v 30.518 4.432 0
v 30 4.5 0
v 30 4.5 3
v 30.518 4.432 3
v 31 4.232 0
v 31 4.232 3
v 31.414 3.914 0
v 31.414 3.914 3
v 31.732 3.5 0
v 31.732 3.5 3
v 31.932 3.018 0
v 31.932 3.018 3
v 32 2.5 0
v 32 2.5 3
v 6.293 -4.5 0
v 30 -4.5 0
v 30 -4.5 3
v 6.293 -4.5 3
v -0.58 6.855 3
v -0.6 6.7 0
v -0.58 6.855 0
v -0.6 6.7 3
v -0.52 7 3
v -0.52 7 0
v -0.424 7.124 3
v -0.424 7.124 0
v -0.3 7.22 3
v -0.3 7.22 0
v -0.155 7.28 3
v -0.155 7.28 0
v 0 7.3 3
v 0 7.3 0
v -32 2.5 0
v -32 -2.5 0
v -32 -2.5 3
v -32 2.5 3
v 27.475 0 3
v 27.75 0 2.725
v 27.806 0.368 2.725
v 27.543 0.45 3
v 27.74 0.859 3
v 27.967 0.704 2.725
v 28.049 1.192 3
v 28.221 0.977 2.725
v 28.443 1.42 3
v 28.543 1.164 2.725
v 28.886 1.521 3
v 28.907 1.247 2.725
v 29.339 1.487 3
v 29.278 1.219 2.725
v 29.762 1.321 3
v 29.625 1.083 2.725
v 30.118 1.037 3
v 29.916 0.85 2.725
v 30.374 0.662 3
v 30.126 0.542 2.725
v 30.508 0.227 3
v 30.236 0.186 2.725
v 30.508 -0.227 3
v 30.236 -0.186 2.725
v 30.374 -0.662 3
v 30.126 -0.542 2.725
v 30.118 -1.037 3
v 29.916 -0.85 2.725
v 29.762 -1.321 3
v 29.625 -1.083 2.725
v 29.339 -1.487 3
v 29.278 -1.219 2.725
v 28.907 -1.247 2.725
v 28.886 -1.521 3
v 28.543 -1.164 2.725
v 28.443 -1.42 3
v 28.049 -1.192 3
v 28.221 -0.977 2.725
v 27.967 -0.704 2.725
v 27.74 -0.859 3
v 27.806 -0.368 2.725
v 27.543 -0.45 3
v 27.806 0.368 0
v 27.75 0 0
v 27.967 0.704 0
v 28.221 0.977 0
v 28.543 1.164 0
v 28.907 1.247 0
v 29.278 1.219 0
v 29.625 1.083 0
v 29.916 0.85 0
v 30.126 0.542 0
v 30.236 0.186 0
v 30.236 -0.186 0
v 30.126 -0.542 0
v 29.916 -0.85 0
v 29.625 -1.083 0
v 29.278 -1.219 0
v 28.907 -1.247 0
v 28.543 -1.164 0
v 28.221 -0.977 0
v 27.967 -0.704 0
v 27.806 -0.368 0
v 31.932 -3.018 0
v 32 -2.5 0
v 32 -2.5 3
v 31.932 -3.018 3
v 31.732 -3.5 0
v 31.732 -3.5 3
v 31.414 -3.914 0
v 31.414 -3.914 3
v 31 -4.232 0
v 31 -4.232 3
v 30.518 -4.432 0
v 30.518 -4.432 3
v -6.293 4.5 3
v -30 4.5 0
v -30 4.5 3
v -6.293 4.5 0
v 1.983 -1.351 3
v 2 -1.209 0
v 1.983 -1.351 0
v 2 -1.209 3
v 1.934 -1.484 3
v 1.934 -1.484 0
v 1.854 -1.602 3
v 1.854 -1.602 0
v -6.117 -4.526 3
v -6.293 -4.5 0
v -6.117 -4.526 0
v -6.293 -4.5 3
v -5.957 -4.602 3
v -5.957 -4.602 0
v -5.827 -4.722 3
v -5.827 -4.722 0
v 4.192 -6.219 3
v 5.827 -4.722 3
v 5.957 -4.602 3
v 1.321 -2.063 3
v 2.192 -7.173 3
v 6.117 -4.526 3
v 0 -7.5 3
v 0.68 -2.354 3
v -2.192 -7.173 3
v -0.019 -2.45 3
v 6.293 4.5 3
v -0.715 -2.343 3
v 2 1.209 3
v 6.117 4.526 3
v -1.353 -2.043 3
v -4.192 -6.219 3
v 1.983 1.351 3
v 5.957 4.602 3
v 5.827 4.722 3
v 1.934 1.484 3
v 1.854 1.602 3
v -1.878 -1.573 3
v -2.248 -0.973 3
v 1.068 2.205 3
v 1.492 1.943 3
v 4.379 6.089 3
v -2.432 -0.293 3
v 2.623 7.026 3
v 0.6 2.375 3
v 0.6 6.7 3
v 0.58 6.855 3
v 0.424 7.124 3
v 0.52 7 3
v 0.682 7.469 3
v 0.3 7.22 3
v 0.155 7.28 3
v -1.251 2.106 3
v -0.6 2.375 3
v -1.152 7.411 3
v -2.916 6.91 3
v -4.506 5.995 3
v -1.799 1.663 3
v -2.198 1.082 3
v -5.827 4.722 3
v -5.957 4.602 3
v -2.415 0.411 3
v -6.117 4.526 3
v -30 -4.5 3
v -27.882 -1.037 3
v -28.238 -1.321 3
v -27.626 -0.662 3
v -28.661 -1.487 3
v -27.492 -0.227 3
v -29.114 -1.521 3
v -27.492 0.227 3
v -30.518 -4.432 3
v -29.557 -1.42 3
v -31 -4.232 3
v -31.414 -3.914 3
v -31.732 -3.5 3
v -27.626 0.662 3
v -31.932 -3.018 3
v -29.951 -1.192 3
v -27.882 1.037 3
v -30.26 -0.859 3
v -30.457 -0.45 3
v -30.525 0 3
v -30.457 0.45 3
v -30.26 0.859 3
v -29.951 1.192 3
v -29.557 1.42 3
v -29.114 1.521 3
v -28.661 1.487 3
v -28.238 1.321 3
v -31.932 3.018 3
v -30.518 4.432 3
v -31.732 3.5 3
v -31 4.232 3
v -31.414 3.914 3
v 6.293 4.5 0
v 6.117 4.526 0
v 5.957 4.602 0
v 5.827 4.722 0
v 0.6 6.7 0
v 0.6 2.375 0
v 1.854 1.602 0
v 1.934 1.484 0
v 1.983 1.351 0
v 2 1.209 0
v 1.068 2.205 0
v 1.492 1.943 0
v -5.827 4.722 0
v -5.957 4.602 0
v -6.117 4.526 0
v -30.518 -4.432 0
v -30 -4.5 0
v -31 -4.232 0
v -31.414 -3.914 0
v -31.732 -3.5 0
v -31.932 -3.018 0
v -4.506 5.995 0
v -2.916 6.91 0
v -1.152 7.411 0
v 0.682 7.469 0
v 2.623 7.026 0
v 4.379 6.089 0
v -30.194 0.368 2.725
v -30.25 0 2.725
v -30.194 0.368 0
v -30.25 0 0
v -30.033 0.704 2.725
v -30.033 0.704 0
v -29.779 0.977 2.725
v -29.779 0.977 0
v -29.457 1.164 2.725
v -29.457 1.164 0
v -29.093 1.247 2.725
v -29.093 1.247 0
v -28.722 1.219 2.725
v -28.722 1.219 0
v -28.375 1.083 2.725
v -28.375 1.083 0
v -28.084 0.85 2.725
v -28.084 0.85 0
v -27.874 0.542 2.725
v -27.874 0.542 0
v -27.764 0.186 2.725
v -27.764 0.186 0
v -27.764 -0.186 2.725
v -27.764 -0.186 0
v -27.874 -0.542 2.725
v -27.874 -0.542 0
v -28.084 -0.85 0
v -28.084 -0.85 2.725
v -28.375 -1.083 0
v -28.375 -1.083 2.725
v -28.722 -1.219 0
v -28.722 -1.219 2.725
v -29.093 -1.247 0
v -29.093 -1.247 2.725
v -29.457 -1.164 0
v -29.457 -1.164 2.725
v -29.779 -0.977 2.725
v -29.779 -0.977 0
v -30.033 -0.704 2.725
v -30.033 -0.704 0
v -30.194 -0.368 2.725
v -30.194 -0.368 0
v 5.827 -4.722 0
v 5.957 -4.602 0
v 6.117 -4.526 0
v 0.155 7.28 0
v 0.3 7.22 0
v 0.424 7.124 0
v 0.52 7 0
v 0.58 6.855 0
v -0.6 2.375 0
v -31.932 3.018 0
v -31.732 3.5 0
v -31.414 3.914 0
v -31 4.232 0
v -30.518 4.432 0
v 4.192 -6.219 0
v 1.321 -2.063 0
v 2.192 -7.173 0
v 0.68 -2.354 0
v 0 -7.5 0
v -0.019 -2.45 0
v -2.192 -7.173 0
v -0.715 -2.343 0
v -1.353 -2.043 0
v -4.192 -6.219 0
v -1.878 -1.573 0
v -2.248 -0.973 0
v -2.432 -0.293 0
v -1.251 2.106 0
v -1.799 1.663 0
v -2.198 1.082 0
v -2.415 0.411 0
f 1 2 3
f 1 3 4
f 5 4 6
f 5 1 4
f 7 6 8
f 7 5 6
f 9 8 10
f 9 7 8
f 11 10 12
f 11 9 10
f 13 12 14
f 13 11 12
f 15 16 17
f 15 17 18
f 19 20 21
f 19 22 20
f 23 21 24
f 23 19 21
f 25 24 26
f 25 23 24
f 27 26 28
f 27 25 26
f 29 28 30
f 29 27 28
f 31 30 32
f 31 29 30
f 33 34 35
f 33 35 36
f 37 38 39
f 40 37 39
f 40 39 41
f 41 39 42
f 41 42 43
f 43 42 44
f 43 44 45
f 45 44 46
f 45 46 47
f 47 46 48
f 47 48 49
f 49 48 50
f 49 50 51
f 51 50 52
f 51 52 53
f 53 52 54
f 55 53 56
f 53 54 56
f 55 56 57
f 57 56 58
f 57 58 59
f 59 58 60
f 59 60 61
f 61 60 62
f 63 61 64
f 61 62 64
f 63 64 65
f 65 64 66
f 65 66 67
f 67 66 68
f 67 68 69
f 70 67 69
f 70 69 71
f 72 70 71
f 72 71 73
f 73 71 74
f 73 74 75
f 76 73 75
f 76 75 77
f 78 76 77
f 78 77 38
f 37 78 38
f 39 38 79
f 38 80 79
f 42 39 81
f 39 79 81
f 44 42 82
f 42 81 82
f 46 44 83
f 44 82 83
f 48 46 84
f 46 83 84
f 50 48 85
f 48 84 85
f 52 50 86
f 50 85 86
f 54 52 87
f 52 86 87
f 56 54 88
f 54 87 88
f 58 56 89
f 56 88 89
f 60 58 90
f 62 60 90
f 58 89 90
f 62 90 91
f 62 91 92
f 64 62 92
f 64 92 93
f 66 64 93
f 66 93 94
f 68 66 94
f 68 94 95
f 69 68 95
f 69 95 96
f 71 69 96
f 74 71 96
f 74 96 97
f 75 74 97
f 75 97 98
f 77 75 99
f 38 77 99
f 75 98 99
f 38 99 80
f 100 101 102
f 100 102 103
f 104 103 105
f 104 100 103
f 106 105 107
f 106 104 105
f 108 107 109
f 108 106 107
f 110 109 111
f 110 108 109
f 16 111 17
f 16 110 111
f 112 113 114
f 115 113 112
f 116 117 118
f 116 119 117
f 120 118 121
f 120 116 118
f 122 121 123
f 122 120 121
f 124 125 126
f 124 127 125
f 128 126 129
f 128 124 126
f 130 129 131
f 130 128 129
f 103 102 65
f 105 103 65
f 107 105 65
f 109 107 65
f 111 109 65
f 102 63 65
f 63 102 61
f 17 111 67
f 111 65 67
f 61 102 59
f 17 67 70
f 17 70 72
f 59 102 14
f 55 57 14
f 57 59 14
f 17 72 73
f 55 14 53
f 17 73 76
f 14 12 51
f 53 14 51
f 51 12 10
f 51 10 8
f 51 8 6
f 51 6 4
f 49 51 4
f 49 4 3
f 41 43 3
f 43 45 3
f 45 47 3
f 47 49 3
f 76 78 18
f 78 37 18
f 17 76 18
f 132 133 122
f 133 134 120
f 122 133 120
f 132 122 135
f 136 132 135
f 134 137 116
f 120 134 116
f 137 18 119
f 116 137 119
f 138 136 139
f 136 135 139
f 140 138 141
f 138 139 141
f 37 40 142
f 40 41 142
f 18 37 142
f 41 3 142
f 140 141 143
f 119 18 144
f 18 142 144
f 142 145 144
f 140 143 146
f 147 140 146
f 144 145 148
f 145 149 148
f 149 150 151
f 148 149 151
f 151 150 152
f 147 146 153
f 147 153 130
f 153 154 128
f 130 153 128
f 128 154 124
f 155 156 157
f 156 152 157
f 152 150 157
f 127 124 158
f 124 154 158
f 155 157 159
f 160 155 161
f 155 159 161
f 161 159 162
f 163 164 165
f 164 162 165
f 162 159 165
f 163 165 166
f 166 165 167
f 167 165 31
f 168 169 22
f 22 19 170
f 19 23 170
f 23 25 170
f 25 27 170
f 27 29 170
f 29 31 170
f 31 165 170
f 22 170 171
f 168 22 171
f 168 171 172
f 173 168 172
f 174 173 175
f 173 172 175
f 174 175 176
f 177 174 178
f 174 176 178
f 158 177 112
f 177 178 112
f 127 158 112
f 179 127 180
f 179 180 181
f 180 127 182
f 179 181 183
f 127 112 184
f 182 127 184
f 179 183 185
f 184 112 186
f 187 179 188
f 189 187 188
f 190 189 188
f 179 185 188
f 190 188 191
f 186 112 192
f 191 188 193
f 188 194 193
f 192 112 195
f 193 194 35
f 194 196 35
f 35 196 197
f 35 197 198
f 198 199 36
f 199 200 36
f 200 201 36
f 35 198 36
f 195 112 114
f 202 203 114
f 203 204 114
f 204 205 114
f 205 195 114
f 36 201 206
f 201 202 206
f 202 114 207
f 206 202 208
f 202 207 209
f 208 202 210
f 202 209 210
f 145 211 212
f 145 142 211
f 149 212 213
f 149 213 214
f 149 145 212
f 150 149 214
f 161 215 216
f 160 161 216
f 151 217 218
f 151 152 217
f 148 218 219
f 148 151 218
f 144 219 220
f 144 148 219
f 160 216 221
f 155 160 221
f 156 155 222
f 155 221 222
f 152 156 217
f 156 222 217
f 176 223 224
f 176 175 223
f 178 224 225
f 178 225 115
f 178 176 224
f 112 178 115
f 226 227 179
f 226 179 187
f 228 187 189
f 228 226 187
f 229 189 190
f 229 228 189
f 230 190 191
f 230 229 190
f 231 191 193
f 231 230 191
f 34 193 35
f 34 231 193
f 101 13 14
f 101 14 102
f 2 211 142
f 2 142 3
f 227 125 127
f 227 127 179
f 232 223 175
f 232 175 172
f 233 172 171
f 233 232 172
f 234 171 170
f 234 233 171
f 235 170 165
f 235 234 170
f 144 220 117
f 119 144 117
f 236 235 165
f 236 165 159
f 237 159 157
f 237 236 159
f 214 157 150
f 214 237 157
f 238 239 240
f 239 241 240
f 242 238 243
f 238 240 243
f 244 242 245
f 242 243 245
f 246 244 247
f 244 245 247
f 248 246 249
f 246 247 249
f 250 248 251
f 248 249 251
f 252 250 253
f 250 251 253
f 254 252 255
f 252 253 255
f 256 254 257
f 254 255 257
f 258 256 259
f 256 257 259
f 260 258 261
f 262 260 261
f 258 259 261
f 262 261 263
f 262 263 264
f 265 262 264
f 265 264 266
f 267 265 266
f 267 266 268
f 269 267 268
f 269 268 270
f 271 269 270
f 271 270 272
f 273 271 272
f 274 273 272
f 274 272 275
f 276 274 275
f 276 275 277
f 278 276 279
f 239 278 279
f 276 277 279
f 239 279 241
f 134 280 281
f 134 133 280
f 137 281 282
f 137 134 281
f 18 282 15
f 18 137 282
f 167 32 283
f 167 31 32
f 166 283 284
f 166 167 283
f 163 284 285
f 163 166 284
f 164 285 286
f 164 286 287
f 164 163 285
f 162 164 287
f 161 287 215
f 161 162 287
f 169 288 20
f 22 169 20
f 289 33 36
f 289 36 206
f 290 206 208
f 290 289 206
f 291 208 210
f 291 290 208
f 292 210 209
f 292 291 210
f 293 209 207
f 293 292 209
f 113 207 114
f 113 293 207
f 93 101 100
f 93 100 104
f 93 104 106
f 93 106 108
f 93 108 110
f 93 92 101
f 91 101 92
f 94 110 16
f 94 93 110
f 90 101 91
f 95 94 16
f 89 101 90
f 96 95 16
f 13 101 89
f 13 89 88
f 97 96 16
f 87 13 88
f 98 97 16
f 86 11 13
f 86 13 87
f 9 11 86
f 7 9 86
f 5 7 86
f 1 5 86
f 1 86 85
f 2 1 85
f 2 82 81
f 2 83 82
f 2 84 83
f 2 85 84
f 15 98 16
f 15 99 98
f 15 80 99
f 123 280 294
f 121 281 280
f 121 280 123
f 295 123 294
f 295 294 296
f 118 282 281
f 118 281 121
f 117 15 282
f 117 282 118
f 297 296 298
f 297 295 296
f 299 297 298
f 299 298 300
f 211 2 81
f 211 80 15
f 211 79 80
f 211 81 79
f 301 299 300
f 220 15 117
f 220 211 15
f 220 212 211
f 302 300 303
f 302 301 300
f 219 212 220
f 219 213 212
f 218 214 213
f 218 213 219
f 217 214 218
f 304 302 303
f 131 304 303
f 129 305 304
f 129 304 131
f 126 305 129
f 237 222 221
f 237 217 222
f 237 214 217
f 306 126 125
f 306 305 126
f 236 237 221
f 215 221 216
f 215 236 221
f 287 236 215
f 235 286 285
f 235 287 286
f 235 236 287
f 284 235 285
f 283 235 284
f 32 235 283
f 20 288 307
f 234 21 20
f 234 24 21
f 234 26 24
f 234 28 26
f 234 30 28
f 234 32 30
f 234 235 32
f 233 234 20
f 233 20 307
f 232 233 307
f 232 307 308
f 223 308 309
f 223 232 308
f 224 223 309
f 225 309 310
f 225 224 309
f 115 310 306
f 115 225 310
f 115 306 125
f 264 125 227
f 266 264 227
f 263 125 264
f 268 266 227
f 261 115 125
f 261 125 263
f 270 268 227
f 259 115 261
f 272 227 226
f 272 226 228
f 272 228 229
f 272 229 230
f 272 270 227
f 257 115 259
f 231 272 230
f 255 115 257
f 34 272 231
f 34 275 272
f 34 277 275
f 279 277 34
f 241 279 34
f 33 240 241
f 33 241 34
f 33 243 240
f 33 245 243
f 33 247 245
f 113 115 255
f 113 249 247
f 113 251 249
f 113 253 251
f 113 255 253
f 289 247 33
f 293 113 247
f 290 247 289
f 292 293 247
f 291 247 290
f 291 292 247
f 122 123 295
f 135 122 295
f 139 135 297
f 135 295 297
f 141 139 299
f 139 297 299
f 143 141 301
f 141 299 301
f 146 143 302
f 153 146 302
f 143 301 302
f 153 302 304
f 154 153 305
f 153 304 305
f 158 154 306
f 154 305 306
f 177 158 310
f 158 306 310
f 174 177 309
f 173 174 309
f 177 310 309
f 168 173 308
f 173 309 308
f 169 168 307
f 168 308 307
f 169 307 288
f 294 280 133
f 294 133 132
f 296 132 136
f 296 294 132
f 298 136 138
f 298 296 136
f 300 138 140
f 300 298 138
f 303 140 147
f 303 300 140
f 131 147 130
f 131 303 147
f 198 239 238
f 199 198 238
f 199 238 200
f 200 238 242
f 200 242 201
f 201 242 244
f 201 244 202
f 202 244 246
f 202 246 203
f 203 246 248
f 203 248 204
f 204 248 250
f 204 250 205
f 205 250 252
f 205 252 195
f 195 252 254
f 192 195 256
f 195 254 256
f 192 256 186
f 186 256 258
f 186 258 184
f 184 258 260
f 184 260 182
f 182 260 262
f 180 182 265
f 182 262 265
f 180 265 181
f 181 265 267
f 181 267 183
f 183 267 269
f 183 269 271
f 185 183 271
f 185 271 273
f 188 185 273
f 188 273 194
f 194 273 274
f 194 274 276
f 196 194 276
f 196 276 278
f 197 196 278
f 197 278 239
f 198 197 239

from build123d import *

# Parameters (mm, degrees)
EXTRUDE_1_DEPTH      = 3
M3X0_5_1_D           = 2.5
M3X0_5_1_CSINK_D     = 3.05
M3X0_5_1_CSINK_ANGLE = 90
FILLET_1_R           = 0.6


with BuildPart() as part:
    # 草图1 → 凸台-拉伸1 (new body)
    with BuildSketch(Plane.XY):
        with BuildLine():
            Line((6, 4.5), (30, 4.5))
            ThreePointArc((30, 4.5), (31.414213562, 3.914213562), (32, 2.5))
            Line((32, 2.5), (32, -2.5))
            ThreePointArc((32, -2.5), (31.414213562, -3.914213562), (30, -4.5))
            Line((30, -4.5), (6, -4.5))
            ThreePointArc((6, -4.5), (0, -7.5), (-6, -4.5))
            Line((-6, -4.5), (-30, -4.5))
            ThreePointArc((-30, -4.5), (-31.414213562, -3.914213562), (-32, -2.5))
            Line((-32, -2.5), (-32, 2.5))
            ThreePointArc((-32, 2.5), (-31.414213562, 3.914213562), (-30, 4.5))
            Line((-30, 4.5), (-6, 4.5))
            ThreePointArc((-6, 4.5), (-3.045393494, 6.853873246), (0.681818182, 7.468943966))
            ThreePointArc((0.681818182, 7.468943966), (3.6558625, 6.548638742), (6, 4.5))
        make_face()
        with BuildLine():
            Line((0.6, 7.275300681), (0.6, 2.375394704))
            ThreePointArc((0.6, 2.375394704), (1.385836512, 2.020385399), (2, 1.41509717))
            Line((2, 1.41509717), (2, -1.41509717))
            ThreePointArc((2, -1.41509717), (-2.020385399, -1.385836512), (-0.6, 2.375394704))
            Line((-0.6, 2.375394704), (-0.6, 7.275300681))
            ThreePointArc((-0.6, 7.275300681), (0, 7.3), (0.6, 7.275300681))
        make_face(mode=Mode.SUBTRACT)
    extrude(amount=EXTRUDE_1_DEPTH)

    # M3x0.5 螺纹孔1 (through all)
    with Locations(Plane.XY.offset(3)):
        with Locations((-29, 0), (29, 0)):
            CounterSinkHole(M3X0_5_1_D / 2, M3X0_5_1_CSINK_D / 2, counter_sink_angle=M3X0_5_1_CSINK_ANGLE)

    # 圆角1
    fillet_1_edges = [part.edges().sort_by_distance(p)[0] for p in [
        (0.6, 7.275300681, 1.5),
        (-0.6, 7.275300681, 1.5),
        (2, -1.41509717, 1.5),
        (2, 1.41509717, 1.5),
        (-6, -4.5, 1.5),
        (6, -4.5, 1.5),
        (6, 4.5, 1.5),
        (-6, 4.5, 1.5),
    ]]
    fillet(fillet_1_edges, radius=FILLET_1_R - 0.0001)  # a hair under: the kernel refuses the full size


solid = part.part
